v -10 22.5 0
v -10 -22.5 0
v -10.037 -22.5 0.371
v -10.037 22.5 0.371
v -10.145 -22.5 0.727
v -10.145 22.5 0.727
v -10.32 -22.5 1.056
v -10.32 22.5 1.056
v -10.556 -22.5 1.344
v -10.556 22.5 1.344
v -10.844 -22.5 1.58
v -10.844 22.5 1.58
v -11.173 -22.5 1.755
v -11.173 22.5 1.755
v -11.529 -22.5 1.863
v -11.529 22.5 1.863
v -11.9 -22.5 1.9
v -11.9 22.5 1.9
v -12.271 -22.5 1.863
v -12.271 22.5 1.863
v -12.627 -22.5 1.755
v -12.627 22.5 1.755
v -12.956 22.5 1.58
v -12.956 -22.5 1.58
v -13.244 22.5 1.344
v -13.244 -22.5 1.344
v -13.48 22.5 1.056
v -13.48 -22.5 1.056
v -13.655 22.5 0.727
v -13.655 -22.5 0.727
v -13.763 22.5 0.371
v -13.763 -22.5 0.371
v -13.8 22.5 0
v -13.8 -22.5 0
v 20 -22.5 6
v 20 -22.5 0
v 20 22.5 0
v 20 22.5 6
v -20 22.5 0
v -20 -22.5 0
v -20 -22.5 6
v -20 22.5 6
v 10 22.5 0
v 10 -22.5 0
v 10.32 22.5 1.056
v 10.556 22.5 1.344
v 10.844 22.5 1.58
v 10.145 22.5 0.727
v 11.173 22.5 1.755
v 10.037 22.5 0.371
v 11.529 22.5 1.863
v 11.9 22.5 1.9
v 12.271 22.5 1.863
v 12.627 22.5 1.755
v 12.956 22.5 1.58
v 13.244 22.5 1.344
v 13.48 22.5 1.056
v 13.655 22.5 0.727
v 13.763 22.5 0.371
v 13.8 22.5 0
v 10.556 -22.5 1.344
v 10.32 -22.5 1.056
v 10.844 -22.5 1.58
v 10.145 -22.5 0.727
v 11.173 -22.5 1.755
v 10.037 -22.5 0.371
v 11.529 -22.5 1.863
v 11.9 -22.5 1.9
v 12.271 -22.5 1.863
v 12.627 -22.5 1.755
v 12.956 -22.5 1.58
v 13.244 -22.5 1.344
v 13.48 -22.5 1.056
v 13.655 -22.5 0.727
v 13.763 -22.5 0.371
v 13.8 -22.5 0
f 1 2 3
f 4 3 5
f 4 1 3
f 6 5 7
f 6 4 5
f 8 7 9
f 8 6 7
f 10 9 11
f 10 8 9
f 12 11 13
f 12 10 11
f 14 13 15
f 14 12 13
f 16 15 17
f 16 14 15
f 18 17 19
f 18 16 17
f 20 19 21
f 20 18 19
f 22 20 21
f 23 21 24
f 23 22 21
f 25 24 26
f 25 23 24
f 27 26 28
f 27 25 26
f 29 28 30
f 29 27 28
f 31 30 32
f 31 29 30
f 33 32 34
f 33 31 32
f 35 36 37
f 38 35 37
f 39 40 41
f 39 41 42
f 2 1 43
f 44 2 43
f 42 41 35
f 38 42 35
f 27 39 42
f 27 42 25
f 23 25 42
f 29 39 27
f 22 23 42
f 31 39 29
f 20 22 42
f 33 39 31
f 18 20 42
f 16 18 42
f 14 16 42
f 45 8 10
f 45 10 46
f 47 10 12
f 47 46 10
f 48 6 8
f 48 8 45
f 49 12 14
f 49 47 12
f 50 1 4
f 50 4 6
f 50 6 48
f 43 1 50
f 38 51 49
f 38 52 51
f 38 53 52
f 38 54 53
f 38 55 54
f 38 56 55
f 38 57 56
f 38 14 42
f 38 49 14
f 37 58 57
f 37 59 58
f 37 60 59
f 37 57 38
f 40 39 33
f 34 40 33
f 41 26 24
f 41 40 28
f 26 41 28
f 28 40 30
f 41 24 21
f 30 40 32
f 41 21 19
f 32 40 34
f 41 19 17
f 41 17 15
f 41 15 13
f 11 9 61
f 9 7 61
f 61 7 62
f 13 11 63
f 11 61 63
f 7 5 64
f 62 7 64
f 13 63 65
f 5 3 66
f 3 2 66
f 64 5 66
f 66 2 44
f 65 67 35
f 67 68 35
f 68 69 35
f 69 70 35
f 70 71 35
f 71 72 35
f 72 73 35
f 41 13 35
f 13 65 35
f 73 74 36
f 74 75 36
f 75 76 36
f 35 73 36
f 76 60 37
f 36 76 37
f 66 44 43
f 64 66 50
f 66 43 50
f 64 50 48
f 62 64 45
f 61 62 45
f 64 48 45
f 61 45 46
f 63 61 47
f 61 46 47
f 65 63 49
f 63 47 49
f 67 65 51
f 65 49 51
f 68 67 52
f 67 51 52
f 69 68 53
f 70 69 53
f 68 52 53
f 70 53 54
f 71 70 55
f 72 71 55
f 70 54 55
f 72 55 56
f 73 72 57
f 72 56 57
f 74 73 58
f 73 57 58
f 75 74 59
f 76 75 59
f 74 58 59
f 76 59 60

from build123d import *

# Parameters (mm, degrees)
SKETCH1_W          = 40
SKETCH1_H          = 45
BASE_DEPTH         = 6
WIRE_GROOVES_DEPTH = 50.608467019


with BuildPart() as part:
    # Sketch1 → Base (new body)
    with BuildSketch(Plane.XY):
        Rectangle(SKETCH1_W, SKETCH1_H)
    extrude(amount=BASE_DEPTH)

    # Sketch2 → Wire Grooves (cut, through all)
    with BuildSketch(Plane(origin=(0, 22.5, 0), x_dir=(1, 0, 0), z_dir=(0, 1, 0))):
        with BuildLine():
            Line((-13.8, 0), (-10, 0))
            ThreePointArc((-10, 0), (-11.9, -1.9), (-13.8, 0))
        make_face()
        with BuildLine():
            Line((13.8, 0), (10, 0))
            ThreePointArc((10, 0), (11.9, -1.9), (13.8, 0))
        make_face()
    extrude(amount=-WIRE_GROOVES_DEPTH, mode=Mode.SUBTRACT)


solid = part.part
